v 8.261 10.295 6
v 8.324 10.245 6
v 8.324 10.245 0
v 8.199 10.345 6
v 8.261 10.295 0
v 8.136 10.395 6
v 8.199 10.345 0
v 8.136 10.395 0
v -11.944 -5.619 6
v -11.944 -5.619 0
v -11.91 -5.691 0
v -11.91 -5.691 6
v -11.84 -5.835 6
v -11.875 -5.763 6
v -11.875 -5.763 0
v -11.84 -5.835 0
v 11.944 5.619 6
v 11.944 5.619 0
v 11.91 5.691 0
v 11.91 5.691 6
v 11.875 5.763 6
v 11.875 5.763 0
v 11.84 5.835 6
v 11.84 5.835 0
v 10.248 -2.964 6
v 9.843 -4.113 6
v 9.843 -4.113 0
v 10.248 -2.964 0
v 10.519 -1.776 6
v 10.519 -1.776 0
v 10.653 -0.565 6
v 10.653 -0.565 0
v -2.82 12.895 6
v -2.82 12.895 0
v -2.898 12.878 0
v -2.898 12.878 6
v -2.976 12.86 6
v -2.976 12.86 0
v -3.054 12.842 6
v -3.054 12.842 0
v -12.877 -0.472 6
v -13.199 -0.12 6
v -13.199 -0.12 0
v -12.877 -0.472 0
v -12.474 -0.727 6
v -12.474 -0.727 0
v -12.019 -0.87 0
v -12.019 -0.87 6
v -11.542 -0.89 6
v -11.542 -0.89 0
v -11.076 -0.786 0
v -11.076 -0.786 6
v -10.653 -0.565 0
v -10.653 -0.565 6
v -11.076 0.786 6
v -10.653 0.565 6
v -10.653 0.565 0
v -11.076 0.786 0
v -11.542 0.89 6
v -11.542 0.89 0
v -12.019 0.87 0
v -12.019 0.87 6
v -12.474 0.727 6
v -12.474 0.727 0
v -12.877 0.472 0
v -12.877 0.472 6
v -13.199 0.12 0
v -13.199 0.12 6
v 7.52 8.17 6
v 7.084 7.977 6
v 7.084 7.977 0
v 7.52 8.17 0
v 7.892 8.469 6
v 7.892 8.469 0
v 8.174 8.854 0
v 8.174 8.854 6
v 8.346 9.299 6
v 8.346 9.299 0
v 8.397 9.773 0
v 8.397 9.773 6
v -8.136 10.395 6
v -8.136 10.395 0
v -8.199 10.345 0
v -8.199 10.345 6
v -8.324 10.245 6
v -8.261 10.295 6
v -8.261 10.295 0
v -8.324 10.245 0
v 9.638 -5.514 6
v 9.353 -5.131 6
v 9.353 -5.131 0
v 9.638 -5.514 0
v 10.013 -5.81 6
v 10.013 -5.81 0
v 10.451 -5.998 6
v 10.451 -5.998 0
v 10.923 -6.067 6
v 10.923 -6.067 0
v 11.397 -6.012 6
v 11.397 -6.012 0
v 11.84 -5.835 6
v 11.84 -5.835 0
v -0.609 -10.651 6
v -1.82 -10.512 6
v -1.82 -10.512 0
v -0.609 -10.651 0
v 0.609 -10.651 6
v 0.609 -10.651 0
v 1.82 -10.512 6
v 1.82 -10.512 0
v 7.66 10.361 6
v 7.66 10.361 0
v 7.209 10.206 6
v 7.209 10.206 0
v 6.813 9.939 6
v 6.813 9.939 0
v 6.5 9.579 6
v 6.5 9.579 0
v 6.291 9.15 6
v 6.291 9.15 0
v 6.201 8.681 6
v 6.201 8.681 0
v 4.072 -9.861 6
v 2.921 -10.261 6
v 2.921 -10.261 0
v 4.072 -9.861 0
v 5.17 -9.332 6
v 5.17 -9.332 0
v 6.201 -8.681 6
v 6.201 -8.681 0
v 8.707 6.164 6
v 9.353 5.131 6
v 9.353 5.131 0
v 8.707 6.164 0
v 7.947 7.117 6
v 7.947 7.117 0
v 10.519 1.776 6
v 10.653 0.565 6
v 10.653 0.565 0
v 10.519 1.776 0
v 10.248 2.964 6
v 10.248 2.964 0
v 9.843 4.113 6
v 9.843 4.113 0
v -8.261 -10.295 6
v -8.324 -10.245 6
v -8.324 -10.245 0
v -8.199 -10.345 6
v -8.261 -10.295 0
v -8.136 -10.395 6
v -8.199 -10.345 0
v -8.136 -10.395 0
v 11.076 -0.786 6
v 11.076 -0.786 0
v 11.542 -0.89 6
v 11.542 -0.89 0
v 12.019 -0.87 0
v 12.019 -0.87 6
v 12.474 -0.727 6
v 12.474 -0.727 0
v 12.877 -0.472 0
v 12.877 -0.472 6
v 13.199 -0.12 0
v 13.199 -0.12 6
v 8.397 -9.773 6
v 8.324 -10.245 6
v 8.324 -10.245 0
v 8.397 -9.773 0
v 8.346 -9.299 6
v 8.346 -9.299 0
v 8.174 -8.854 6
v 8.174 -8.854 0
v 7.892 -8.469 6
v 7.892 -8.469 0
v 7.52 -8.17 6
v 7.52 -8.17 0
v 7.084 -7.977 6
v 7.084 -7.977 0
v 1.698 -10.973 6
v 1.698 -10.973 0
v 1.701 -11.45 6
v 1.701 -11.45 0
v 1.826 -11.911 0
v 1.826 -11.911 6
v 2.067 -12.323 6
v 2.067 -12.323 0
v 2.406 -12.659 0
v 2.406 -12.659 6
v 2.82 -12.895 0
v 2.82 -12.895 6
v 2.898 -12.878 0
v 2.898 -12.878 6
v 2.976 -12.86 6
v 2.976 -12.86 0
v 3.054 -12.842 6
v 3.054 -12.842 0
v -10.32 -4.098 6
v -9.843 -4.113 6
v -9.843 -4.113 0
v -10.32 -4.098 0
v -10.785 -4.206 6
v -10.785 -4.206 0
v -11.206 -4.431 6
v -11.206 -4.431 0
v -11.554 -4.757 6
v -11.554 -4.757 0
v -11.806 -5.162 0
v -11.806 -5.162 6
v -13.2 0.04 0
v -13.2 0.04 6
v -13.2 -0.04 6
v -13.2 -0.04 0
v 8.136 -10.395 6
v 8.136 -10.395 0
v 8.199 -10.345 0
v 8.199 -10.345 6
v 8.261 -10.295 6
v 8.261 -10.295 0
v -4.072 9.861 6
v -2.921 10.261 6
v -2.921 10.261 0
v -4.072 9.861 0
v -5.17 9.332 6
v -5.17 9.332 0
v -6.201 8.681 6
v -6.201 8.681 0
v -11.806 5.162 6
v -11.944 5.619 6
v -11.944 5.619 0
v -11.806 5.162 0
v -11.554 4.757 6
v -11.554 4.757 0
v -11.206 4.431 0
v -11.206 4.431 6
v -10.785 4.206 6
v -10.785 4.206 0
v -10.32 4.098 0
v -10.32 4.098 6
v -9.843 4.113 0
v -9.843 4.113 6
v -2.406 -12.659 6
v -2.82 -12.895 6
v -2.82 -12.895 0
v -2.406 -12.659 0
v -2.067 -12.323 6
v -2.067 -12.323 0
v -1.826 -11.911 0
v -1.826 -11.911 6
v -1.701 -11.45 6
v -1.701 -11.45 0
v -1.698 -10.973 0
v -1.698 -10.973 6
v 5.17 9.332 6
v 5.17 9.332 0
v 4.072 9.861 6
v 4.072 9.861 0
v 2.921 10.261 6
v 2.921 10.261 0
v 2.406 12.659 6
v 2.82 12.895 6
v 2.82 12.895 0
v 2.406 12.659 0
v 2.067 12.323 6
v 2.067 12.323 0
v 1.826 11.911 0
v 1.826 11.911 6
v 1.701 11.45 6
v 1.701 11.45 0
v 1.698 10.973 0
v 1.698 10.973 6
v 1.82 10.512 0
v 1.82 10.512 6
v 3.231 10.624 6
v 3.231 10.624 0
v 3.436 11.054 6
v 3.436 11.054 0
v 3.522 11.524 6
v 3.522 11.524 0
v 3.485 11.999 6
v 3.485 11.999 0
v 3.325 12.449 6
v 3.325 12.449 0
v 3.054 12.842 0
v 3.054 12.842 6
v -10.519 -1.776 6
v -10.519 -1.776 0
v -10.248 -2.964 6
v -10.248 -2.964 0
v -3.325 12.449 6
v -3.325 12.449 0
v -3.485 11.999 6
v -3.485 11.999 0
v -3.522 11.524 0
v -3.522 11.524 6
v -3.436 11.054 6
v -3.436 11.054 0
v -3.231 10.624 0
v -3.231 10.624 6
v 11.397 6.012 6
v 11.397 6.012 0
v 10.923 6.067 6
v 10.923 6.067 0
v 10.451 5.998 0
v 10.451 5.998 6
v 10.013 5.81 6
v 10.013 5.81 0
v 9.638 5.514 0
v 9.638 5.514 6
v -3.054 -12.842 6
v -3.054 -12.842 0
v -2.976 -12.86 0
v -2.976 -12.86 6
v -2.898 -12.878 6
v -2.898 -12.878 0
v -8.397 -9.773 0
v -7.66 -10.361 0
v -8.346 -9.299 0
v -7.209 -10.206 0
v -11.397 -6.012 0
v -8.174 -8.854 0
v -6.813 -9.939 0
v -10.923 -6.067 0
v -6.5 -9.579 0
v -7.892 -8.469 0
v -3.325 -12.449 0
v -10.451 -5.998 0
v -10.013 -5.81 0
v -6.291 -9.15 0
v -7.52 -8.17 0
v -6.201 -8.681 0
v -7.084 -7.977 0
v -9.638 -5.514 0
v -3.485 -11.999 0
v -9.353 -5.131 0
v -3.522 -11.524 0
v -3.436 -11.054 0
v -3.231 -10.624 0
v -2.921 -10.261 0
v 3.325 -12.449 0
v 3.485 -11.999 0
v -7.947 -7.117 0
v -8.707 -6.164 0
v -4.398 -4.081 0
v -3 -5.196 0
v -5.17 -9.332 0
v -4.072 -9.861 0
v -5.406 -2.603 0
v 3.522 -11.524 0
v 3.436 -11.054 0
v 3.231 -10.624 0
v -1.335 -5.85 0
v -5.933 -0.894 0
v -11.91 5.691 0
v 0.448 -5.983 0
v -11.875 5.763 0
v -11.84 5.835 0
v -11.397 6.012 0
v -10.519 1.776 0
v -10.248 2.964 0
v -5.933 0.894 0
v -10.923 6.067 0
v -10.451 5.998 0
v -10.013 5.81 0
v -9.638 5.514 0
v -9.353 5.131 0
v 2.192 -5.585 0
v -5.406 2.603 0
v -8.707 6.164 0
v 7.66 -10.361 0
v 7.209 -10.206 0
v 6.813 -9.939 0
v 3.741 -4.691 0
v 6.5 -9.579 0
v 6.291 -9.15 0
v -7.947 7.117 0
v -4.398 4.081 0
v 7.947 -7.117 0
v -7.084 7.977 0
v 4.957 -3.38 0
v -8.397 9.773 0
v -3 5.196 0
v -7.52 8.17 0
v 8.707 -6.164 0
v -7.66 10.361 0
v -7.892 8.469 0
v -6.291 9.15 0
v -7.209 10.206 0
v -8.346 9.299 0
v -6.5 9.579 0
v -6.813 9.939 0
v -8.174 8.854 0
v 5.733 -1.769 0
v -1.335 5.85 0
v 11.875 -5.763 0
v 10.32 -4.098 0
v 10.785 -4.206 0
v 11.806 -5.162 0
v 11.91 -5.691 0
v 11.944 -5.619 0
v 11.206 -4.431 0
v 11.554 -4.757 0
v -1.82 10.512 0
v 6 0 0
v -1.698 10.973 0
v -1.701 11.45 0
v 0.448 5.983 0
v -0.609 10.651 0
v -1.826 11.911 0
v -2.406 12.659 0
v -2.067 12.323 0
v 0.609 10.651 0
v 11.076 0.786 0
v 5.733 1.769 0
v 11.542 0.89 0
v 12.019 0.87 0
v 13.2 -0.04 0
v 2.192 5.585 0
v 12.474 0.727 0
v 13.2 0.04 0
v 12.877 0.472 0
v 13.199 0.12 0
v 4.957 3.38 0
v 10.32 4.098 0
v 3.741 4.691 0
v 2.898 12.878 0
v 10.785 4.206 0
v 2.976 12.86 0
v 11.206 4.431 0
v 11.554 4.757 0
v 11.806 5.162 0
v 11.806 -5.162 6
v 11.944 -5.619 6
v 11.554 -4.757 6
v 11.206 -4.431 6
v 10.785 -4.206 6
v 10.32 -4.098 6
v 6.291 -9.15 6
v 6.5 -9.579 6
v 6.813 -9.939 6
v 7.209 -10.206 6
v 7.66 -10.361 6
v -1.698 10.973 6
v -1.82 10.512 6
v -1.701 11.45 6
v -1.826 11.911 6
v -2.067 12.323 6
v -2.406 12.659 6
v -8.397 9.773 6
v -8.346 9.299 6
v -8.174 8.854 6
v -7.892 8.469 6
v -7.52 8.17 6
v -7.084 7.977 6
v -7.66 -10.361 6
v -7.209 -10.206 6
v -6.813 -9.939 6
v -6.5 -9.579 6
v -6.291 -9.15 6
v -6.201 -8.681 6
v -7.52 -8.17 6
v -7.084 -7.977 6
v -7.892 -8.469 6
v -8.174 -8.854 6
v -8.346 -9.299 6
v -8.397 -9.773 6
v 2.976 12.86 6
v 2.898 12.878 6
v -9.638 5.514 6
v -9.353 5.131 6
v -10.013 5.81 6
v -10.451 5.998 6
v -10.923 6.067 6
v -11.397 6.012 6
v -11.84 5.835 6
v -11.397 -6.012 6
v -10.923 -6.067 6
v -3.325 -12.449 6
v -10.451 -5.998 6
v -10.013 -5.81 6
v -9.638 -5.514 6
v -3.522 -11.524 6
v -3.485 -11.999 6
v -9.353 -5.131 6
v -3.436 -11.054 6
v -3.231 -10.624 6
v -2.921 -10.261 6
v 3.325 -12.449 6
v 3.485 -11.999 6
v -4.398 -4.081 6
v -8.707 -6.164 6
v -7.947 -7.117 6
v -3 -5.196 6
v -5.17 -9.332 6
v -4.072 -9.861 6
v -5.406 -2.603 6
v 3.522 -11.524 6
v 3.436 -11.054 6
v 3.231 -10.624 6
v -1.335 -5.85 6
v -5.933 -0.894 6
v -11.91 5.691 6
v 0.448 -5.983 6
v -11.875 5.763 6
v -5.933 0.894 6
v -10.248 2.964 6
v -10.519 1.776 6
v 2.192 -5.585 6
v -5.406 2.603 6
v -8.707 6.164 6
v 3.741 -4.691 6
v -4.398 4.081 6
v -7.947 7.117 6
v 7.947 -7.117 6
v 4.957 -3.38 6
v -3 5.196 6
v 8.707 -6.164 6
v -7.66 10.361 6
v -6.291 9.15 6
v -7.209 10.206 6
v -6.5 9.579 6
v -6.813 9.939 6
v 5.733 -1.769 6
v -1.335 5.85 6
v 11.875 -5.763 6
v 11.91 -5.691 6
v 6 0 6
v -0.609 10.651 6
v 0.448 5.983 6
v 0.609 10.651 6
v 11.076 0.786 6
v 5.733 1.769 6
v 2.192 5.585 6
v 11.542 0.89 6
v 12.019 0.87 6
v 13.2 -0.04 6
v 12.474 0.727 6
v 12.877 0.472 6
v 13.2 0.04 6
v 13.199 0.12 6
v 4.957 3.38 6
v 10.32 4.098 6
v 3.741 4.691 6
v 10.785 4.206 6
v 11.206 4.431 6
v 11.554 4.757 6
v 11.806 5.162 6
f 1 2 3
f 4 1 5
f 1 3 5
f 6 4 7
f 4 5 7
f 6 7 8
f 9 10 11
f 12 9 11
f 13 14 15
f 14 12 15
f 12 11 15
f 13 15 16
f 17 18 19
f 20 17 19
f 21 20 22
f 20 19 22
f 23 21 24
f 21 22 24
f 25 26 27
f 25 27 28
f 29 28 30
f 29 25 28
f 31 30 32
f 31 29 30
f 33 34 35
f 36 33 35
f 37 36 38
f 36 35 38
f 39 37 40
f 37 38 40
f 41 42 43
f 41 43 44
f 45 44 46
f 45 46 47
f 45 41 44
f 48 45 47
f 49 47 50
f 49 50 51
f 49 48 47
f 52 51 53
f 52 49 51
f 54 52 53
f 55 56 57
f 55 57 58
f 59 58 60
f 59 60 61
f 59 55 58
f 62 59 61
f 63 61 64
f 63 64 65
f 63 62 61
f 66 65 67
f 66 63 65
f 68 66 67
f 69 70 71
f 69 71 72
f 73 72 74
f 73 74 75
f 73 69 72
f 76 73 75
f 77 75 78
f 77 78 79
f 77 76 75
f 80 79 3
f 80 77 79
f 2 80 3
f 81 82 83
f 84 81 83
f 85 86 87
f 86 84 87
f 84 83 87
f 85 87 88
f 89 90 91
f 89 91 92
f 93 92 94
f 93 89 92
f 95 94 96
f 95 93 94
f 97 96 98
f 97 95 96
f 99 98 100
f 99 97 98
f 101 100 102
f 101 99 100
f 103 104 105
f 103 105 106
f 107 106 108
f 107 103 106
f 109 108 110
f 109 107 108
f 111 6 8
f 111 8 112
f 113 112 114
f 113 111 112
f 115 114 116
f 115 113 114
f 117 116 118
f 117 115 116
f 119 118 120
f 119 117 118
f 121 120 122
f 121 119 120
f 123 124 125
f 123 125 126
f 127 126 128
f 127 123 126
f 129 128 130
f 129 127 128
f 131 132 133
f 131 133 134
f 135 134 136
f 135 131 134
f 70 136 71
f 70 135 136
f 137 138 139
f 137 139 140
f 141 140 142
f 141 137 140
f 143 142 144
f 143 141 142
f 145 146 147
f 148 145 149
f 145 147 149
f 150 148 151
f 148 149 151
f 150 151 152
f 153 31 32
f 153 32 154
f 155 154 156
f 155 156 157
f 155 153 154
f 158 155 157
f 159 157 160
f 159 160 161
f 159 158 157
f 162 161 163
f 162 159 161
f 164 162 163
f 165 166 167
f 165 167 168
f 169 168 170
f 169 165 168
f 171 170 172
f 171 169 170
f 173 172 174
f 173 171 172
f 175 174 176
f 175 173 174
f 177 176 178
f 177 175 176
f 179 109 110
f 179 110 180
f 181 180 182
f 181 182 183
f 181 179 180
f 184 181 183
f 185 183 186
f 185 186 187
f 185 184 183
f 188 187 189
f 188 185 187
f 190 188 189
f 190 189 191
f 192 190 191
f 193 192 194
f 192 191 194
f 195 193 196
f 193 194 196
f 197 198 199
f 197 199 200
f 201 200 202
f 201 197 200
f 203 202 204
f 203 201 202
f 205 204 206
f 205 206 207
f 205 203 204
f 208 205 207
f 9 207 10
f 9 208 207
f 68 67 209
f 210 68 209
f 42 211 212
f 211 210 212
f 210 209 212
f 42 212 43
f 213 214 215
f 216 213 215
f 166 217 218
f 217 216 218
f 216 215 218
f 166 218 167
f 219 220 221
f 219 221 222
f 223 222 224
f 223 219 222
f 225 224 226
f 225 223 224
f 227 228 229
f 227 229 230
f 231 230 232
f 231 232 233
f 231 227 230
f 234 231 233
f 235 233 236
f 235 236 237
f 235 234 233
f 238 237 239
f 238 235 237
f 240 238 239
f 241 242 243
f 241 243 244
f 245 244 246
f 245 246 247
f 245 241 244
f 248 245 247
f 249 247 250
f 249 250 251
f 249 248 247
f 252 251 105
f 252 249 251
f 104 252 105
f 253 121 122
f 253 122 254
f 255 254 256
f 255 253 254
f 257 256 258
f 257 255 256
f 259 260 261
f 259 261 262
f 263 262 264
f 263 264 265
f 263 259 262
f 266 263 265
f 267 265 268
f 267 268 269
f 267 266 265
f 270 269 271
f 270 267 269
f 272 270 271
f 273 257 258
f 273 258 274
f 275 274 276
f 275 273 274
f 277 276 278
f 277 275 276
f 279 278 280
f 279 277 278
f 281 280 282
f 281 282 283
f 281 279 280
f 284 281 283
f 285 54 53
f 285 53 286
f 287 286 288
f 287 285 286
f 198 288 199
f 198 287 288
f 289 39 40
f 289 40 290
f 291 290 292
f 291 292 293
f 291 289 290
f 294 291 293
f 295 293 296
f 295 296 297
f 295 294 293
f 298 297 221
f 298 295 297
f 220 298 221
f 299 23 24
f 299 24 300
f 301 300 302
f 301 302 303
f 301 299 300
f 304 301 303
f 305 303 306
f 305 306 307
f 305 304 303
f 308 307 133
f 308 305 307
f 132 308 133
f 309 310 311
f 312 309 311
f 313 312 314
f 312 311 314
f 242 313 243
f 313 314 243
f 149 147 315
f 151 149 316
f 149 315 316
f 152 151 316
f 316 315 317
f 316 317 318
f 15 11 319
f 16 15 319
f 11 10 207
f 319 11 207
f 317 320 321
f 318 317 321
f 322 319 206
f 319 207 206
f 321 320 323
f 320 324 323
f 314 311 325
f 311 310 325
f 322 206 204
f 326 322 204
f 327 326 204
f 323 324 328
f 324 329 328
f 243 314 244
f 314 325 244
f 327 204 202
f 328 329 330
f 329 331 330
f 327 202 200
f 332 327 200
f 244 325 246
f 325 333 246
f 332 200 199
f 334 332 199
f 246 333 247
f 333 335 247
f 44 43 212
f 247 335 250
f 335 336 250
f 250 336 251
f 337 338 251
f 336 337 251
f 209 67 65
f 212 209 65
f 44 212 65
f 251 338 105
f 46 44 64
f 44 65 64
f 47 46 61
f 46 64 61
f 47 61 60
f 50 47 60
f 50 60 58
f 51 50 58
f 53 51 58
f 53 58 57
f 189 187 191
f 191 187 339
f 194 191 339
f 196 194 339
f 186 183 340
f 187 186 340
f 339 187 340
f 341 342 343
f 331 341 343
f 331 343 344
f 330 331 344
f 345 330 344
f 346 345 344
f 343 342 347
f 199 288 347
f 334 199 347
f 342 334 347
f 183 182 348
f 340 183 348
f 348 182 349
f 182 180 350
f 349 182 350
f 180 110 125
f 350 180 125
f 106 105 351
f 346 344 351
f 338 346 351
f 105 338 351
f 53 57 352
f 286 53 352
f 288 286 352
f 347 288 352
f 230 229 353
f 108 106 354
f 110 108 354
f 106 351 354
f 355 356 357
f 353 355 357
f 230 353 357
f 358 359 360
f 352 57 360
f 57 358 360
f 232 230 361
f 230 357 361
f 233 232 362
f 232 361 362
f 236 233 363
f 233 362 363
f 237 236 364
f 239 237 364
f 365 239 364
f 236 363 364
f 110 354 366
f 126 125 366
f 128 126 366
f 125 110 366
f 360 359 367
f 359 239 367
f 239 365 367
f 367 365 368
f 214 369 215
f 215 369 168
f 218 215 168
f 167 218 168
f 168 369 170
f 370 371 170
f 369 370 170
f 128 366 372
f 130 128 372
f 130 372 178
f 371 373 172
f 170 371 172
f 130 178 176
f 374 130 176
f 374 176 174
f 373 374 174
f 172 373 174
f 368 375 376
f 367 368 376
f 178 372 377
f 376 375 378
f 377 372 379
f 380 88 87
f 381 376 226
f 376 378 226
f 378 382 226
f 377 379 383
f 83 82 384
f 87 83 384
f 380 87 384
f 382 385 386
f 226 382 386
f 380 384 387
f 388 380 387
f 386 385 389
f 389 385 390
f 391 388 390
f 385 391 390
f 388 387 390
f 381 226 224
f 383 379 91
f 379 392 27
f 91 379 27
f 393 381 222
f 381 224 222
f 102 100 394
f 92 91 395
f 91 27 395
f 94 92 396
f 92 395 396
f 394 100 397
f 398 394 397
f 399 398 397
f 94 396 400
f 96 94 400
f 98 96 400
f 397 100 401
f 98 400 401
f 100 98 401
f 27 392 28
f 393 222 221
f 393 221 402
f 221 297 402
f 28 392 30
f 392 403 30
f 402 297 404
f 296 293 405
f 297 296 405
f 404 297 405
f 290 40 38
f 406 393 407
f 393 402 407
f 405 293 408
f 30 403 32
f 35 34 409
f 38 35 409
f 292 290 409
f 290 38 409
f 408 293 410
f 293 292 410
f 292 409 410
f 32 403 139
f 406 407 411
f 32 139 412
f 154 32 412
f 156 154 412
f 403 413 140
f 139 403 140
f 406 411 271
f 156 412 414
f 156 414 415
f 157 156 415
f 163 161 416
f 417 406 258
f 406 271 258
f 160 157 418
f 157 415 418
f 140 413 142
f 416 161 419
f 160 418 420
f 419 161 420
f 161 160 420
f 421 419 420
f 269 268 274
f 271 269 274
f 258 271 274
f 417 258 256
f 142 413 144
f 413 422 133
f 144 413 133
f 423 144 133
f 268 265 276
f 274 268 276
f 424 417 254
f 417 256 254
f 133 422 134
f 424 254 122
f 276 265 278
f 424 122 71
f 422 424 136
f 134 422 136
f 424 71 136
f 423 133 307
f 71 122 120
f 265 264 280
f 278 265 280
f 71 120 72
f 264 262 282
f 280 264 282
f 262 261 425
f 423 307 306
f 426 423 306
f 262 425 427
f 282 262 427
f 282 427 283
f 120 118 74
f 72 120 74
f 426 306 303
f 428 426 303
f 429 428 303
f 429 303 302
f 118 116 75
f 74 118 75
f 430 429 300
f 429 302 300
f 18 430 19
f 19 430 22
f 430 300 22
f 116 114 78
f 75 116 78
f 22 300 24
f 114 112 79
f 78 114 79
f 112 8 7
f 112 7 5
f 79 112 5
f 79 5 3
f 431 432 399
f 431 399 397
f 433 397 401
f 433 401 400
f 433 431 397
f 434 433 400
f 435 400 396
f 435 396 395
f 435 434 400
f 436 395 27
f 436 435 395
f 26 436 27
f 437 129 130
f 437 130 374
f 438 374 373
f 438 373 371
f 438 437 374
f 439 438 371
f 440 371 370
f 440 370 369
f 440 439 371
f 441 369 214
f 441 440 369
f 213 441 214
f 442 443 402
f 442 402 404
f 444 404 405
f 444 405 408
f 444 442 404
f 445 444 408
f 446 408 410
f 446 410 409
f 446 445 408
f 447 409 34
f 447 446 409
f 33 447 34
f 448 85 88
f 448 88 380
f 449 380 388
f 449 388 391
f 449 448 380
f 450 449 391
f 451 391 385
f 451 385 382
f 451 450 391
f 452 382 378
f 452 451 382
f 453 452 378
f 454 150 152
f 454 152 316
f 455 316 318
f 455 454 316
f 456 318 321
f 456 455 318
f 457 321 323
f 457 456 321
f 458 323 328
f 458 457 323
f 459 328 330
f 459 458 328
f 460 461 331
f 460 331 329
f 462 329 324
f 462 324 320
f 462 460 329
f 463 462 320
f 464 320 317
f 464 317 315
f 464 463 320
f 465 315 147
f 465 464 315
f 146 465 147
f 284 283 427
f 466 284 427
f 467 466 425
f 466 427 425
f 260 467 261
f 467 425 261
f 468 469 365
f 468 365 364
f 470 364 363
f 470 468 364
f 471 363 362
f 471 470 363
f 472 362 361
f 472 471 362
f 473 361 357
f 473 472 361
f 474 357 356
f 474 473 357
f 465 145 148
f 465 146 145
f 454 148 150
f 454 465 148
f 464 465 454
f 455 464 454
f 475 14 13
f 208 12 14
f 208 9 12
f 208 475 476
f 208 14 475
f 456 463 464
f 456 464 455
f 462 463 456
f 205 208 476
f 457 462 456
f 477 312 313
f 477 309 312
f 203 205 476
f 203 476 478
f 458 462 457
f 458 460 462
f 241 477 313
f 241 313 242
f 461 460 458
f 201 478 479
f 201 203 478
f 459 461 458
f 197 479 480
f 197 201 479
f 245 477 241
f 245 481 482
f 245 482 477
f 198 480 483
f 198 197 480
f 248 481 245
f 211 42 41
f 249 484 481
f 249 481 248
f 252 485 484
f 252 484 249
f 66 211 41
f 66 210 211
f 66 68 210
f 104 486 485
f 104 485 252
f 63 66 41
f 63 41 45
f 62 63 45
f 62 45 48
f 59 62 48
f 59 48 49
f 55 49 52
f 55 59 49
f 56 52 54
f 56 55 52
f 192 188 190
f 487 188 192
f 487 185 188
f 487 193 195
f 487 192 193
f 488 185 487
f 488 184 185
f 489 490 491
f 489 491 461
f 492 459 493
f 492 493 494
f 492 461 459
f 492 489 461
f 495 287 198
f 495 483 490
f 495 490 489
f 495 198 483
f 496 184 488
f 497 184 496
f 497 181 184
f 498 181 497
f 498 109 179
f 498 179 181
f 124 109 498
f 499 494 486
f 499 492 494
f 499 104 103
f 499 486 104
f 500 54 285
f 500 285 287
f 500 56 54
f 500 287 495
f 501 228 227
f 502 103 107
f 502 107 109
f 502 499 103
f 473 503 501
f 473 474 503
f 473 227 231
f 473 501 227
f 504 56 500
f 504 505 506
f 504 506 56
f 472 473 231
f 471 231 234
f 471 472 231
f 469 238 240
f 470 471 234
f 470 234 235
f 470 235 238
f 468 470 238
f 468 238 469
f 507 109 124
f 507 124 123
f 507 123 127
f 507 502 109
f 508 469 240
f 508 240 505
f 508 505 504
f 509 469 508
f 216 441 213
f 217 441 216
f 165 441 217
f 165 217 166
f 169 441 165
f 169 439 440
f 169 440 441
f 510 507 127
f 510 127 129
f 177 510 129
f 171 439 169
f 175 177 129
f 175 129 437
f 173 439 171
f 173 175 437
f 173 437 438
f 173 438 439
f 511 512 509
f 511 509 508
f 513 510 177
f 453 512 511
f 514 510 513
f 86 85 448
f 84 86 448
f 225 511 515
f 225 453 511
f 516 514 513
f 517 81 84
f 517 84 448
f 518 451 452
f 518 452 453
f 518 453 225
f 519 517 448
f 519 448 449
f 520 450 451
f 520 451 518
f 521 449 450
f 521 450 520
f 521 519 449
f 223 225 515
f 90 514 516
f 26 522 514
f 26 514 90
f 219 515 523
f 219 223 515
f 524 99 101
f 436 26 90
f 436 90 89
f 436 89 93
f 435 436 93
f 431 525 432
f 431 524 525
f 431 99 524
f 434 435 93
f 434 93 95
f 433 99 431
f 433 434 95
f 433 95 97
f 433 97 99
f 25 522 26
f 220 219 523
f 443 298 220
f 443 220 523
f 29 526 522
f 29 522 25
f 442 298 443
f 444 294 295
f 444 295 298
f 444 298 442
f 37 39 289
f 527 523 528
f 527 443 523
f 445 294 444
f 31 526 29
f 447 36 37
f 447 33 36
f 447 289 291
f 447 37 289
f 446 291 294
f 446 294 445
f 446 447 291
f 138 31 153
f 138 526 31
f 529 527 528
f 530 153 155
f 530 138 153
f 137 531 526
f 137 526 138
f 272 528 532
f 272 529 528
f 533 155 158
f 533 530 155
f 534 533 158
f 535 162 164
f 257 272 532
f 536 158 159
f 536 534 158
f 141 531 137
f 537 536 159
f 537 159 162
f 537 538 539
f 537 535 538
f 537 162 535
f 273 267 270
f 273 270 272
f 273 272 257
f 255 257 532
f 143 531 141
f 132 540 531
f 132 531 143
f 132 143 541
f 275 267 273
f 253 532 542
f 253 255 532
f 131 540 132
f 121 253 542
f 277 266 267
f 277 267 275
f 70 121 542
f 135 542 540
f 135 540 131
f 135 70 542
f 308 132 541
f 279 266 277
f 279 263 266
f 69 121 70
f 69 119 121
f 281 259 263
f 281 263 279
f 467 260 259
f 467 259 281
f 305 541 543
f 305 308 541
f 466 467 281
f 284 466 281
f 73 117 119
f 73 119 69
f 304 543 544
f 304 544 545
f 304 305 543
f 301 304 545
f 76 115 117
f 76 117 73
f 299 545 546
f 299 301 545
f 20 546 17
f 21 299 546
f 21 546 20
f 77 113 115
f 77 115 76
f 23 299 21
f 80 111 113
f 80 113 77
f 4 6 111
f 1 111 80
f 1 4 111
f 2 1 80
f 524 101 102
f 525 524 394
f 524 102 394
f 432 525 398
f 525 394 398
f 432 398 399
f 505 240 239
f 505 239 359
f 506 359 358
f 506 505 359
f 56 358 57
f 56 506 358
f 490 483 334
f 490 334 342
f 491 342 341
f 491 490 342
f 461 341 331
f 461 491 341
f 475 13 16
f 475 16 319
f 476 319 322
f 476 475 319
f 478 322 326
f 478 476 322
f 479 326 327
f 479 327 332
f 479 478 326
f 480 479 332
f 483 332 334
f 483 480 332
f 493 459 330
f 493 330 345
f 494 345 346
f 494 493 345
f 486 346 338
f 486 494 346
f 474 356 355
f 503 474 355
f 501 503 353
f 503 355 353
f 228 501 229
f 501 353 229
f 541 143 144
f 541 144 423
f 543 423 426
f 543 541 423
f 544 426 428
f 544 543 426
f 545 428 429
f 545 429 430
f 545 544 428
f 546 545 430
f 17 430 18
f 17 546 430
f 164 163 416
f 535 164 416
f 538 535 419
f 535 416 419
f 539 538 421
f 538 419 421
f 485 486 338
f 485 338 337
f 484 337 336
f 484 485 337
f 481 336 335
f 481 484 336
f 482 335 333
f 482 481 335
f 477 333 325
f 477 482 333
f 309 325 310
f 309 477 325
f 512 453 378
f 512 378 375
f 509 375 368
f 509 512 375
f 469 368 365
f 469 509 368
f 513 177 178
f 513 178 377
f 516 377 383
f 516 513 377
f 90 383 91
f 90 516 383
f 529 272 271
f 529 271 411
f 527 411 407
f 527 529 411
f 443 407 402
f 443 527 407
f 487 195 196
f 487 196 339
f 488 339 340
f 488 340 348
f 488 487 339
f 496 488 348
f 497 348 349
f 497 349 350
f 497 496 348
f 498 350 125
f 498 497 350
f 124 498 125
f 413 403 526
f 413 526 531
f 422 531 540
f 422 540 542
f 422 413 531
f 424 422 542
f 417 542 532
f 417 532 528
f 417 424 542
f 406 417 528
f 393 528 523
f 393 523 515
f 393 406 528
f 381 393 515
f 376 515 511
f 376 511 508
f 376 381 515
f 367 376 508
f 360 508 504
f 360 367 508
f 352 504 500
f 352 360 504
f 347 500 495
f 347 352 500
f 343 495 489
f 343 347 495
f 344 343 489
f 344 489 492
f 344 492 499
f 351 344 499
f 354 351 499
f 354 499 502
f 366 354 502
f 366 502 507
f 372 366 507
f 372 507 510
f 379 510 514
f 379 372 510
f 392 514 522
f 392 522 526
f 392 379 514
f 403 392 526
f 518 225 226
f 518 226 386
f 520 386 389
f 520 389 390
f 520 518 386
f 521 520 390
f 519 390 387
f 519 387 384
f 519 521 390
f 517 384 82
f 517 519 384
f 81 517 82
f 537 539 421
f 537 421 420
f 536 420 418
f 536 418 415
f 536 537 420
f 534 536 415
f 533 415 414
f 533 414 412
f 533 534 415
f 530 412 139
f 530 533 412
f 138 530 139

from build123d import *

# Parameters (mm, degrees)
SKETCH1_R           = 13.2
SKETCH1_R_2         = 6
BOSS_EXTRUDE1_DEPTH = 6
CUT_EXTRUDE1_DEPTH  = 7
CIRPATTERN2_COUNT   = 14


with BuildPart() as part:
    # Sketch1 → Boss-Extrude1 (new body)
    with BuildSketch(Plane.XY):
        Circle(SKETCH1_R)
        Circle(SKETCH1_R_2, mode=Mode.SUBTRACT)
    extrude(amount=BOSS_EXTRUDE1_DEPTH)

    # Sketch2 → Cut-Extrude1 (cut, through all)
    with BuildSketch(Plane.XY.offset(6)):
        with BuildLine():
            ThreePointArc((-2.819851171, 12.895287487), (0, 13.2), (2.819851171, 12.895287487))
            ThreePointArc((2.819851171, 12.895287487), (1.826256171, 11.910750525), (1.819851171, 10.512))
            ThreePointArc((1.819851171, 10.512), (0, 10.668364555), (-1.819851171, 10.512))
            ThreePointArc((-1.819851171, 10.512), (-1.826256171, 11.910750525), (-2.819851171, 12.895287487))
        make_face()
    cut_extrude1 = extrude(amount=-CUT_EXTRUDE1_DEPTH, mode=Mode.SUBTRACT)

    # CirPattern2: Cut-Extrude1 ×14 about axis
    cirpattern2_axis = Axis((0, 0, 0), (0, 0, 1))
    for i in range(1, CIRPATTERN2_COUNT):
        add(cut_extrude1.rotate(cirpattern2_axis, i * 360 / CIRPATTERN2_COUNT), mode=Mode.SUBTRACT)


solid = part.part
